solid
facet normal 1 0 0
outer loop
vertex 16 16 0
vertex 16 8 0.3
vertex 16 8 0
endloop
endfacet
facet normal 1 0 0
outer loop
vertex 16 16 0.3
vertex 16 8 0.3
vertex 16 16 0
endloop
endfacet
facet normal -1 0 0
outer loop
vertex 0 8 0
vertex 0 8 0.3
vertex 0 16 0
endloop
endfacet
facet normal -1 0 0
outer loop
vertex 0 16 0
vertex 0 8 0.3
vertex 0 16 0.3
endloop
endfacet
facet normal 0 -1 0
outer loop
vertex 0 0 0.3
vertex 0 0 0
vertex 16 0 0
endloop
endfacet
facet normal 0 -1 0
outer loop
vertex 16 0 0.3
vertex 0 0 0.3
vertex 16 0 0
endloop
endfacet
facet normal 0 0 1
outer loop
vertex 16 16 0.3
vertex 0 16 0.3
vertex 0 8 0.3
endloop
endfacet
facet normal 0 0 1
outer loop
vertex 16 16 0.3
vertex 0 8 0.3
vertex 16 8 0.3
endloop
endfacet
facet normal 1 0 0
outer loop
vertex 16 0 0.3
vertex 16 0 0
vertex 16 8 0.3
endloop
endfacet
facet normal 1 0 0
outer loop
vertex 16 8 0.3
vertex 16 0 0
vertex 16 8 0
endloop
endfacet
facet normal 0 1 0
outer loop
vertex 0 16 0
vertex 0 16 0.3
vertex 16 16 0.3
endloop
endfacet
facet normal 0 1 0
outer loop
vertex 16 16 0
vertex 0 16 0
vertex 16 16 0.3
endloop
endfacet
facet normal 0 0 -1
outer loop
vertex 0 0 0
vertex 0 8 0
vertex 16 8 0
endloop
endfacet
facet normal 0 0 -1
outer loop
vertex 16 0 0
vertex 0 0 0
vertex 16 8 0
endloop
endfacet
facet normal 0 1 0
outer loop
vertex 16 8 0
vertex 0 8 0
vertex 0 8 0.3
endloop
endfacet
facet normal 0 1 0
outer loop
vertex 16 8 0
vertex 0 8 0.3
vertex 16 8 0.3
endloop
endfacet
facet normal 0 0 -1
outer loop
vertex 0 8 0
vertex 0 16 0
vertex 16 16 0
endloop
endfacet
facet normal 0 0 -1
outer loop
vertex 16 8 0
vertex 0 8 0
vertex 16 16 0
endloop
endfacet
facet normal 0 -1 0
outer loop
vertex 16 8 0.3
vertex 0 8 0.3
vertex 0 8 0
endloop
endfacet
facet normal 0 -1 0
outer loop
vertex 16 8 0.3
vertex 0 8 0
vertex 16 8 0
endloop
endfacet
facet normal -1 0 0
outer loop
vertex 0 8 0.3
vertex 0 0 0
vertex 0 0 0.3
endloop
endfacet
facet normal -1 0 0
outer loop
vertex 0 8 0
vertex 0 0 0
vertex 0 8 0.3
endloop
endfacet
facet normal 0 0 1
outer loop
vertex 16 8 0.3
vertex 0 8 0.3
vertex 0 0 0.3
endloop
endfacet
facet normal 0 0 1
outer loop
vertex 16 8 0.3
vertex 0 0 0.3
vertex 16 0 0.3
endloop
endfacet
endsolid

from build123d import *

# Parameters (mm, degrees)
CROQUIS1_W              = 16
CROQUIS1_H              = 8
SALIENTE_EXTRUIR1_DEPTH = 0.3
CROQUIS2_W              = 16
CROQUIS2_H              = 8
SALIENTE_EXTRUIR2_DEPTH = 0.3


with BuildPart() as part:
    # Croquis1 → Saliente-Extruir1 (new body)
    with BuildSketch(Plane.XY):
        with Locations((8, 4)):
            Rectangle(CROQUIS1_W, CROQUIS1_H)
    extrude(amount=SALIENTE_EXTRUIR1_DEPTH)


with BuildPart() as body_2:
    # Croquis2 → Saliente-Extruir2 (new body)
    with BuildSketch(Plane.XY.offset(0.3)):
        with Locations((8, 12)):
            Rectangle(CROQUIS2_W, CROQUIS2_H)
    extrude(amount=-SALIENTE_EXTRUIR2_DEPTH)


solid = Compound([part.part, body_2.part])
